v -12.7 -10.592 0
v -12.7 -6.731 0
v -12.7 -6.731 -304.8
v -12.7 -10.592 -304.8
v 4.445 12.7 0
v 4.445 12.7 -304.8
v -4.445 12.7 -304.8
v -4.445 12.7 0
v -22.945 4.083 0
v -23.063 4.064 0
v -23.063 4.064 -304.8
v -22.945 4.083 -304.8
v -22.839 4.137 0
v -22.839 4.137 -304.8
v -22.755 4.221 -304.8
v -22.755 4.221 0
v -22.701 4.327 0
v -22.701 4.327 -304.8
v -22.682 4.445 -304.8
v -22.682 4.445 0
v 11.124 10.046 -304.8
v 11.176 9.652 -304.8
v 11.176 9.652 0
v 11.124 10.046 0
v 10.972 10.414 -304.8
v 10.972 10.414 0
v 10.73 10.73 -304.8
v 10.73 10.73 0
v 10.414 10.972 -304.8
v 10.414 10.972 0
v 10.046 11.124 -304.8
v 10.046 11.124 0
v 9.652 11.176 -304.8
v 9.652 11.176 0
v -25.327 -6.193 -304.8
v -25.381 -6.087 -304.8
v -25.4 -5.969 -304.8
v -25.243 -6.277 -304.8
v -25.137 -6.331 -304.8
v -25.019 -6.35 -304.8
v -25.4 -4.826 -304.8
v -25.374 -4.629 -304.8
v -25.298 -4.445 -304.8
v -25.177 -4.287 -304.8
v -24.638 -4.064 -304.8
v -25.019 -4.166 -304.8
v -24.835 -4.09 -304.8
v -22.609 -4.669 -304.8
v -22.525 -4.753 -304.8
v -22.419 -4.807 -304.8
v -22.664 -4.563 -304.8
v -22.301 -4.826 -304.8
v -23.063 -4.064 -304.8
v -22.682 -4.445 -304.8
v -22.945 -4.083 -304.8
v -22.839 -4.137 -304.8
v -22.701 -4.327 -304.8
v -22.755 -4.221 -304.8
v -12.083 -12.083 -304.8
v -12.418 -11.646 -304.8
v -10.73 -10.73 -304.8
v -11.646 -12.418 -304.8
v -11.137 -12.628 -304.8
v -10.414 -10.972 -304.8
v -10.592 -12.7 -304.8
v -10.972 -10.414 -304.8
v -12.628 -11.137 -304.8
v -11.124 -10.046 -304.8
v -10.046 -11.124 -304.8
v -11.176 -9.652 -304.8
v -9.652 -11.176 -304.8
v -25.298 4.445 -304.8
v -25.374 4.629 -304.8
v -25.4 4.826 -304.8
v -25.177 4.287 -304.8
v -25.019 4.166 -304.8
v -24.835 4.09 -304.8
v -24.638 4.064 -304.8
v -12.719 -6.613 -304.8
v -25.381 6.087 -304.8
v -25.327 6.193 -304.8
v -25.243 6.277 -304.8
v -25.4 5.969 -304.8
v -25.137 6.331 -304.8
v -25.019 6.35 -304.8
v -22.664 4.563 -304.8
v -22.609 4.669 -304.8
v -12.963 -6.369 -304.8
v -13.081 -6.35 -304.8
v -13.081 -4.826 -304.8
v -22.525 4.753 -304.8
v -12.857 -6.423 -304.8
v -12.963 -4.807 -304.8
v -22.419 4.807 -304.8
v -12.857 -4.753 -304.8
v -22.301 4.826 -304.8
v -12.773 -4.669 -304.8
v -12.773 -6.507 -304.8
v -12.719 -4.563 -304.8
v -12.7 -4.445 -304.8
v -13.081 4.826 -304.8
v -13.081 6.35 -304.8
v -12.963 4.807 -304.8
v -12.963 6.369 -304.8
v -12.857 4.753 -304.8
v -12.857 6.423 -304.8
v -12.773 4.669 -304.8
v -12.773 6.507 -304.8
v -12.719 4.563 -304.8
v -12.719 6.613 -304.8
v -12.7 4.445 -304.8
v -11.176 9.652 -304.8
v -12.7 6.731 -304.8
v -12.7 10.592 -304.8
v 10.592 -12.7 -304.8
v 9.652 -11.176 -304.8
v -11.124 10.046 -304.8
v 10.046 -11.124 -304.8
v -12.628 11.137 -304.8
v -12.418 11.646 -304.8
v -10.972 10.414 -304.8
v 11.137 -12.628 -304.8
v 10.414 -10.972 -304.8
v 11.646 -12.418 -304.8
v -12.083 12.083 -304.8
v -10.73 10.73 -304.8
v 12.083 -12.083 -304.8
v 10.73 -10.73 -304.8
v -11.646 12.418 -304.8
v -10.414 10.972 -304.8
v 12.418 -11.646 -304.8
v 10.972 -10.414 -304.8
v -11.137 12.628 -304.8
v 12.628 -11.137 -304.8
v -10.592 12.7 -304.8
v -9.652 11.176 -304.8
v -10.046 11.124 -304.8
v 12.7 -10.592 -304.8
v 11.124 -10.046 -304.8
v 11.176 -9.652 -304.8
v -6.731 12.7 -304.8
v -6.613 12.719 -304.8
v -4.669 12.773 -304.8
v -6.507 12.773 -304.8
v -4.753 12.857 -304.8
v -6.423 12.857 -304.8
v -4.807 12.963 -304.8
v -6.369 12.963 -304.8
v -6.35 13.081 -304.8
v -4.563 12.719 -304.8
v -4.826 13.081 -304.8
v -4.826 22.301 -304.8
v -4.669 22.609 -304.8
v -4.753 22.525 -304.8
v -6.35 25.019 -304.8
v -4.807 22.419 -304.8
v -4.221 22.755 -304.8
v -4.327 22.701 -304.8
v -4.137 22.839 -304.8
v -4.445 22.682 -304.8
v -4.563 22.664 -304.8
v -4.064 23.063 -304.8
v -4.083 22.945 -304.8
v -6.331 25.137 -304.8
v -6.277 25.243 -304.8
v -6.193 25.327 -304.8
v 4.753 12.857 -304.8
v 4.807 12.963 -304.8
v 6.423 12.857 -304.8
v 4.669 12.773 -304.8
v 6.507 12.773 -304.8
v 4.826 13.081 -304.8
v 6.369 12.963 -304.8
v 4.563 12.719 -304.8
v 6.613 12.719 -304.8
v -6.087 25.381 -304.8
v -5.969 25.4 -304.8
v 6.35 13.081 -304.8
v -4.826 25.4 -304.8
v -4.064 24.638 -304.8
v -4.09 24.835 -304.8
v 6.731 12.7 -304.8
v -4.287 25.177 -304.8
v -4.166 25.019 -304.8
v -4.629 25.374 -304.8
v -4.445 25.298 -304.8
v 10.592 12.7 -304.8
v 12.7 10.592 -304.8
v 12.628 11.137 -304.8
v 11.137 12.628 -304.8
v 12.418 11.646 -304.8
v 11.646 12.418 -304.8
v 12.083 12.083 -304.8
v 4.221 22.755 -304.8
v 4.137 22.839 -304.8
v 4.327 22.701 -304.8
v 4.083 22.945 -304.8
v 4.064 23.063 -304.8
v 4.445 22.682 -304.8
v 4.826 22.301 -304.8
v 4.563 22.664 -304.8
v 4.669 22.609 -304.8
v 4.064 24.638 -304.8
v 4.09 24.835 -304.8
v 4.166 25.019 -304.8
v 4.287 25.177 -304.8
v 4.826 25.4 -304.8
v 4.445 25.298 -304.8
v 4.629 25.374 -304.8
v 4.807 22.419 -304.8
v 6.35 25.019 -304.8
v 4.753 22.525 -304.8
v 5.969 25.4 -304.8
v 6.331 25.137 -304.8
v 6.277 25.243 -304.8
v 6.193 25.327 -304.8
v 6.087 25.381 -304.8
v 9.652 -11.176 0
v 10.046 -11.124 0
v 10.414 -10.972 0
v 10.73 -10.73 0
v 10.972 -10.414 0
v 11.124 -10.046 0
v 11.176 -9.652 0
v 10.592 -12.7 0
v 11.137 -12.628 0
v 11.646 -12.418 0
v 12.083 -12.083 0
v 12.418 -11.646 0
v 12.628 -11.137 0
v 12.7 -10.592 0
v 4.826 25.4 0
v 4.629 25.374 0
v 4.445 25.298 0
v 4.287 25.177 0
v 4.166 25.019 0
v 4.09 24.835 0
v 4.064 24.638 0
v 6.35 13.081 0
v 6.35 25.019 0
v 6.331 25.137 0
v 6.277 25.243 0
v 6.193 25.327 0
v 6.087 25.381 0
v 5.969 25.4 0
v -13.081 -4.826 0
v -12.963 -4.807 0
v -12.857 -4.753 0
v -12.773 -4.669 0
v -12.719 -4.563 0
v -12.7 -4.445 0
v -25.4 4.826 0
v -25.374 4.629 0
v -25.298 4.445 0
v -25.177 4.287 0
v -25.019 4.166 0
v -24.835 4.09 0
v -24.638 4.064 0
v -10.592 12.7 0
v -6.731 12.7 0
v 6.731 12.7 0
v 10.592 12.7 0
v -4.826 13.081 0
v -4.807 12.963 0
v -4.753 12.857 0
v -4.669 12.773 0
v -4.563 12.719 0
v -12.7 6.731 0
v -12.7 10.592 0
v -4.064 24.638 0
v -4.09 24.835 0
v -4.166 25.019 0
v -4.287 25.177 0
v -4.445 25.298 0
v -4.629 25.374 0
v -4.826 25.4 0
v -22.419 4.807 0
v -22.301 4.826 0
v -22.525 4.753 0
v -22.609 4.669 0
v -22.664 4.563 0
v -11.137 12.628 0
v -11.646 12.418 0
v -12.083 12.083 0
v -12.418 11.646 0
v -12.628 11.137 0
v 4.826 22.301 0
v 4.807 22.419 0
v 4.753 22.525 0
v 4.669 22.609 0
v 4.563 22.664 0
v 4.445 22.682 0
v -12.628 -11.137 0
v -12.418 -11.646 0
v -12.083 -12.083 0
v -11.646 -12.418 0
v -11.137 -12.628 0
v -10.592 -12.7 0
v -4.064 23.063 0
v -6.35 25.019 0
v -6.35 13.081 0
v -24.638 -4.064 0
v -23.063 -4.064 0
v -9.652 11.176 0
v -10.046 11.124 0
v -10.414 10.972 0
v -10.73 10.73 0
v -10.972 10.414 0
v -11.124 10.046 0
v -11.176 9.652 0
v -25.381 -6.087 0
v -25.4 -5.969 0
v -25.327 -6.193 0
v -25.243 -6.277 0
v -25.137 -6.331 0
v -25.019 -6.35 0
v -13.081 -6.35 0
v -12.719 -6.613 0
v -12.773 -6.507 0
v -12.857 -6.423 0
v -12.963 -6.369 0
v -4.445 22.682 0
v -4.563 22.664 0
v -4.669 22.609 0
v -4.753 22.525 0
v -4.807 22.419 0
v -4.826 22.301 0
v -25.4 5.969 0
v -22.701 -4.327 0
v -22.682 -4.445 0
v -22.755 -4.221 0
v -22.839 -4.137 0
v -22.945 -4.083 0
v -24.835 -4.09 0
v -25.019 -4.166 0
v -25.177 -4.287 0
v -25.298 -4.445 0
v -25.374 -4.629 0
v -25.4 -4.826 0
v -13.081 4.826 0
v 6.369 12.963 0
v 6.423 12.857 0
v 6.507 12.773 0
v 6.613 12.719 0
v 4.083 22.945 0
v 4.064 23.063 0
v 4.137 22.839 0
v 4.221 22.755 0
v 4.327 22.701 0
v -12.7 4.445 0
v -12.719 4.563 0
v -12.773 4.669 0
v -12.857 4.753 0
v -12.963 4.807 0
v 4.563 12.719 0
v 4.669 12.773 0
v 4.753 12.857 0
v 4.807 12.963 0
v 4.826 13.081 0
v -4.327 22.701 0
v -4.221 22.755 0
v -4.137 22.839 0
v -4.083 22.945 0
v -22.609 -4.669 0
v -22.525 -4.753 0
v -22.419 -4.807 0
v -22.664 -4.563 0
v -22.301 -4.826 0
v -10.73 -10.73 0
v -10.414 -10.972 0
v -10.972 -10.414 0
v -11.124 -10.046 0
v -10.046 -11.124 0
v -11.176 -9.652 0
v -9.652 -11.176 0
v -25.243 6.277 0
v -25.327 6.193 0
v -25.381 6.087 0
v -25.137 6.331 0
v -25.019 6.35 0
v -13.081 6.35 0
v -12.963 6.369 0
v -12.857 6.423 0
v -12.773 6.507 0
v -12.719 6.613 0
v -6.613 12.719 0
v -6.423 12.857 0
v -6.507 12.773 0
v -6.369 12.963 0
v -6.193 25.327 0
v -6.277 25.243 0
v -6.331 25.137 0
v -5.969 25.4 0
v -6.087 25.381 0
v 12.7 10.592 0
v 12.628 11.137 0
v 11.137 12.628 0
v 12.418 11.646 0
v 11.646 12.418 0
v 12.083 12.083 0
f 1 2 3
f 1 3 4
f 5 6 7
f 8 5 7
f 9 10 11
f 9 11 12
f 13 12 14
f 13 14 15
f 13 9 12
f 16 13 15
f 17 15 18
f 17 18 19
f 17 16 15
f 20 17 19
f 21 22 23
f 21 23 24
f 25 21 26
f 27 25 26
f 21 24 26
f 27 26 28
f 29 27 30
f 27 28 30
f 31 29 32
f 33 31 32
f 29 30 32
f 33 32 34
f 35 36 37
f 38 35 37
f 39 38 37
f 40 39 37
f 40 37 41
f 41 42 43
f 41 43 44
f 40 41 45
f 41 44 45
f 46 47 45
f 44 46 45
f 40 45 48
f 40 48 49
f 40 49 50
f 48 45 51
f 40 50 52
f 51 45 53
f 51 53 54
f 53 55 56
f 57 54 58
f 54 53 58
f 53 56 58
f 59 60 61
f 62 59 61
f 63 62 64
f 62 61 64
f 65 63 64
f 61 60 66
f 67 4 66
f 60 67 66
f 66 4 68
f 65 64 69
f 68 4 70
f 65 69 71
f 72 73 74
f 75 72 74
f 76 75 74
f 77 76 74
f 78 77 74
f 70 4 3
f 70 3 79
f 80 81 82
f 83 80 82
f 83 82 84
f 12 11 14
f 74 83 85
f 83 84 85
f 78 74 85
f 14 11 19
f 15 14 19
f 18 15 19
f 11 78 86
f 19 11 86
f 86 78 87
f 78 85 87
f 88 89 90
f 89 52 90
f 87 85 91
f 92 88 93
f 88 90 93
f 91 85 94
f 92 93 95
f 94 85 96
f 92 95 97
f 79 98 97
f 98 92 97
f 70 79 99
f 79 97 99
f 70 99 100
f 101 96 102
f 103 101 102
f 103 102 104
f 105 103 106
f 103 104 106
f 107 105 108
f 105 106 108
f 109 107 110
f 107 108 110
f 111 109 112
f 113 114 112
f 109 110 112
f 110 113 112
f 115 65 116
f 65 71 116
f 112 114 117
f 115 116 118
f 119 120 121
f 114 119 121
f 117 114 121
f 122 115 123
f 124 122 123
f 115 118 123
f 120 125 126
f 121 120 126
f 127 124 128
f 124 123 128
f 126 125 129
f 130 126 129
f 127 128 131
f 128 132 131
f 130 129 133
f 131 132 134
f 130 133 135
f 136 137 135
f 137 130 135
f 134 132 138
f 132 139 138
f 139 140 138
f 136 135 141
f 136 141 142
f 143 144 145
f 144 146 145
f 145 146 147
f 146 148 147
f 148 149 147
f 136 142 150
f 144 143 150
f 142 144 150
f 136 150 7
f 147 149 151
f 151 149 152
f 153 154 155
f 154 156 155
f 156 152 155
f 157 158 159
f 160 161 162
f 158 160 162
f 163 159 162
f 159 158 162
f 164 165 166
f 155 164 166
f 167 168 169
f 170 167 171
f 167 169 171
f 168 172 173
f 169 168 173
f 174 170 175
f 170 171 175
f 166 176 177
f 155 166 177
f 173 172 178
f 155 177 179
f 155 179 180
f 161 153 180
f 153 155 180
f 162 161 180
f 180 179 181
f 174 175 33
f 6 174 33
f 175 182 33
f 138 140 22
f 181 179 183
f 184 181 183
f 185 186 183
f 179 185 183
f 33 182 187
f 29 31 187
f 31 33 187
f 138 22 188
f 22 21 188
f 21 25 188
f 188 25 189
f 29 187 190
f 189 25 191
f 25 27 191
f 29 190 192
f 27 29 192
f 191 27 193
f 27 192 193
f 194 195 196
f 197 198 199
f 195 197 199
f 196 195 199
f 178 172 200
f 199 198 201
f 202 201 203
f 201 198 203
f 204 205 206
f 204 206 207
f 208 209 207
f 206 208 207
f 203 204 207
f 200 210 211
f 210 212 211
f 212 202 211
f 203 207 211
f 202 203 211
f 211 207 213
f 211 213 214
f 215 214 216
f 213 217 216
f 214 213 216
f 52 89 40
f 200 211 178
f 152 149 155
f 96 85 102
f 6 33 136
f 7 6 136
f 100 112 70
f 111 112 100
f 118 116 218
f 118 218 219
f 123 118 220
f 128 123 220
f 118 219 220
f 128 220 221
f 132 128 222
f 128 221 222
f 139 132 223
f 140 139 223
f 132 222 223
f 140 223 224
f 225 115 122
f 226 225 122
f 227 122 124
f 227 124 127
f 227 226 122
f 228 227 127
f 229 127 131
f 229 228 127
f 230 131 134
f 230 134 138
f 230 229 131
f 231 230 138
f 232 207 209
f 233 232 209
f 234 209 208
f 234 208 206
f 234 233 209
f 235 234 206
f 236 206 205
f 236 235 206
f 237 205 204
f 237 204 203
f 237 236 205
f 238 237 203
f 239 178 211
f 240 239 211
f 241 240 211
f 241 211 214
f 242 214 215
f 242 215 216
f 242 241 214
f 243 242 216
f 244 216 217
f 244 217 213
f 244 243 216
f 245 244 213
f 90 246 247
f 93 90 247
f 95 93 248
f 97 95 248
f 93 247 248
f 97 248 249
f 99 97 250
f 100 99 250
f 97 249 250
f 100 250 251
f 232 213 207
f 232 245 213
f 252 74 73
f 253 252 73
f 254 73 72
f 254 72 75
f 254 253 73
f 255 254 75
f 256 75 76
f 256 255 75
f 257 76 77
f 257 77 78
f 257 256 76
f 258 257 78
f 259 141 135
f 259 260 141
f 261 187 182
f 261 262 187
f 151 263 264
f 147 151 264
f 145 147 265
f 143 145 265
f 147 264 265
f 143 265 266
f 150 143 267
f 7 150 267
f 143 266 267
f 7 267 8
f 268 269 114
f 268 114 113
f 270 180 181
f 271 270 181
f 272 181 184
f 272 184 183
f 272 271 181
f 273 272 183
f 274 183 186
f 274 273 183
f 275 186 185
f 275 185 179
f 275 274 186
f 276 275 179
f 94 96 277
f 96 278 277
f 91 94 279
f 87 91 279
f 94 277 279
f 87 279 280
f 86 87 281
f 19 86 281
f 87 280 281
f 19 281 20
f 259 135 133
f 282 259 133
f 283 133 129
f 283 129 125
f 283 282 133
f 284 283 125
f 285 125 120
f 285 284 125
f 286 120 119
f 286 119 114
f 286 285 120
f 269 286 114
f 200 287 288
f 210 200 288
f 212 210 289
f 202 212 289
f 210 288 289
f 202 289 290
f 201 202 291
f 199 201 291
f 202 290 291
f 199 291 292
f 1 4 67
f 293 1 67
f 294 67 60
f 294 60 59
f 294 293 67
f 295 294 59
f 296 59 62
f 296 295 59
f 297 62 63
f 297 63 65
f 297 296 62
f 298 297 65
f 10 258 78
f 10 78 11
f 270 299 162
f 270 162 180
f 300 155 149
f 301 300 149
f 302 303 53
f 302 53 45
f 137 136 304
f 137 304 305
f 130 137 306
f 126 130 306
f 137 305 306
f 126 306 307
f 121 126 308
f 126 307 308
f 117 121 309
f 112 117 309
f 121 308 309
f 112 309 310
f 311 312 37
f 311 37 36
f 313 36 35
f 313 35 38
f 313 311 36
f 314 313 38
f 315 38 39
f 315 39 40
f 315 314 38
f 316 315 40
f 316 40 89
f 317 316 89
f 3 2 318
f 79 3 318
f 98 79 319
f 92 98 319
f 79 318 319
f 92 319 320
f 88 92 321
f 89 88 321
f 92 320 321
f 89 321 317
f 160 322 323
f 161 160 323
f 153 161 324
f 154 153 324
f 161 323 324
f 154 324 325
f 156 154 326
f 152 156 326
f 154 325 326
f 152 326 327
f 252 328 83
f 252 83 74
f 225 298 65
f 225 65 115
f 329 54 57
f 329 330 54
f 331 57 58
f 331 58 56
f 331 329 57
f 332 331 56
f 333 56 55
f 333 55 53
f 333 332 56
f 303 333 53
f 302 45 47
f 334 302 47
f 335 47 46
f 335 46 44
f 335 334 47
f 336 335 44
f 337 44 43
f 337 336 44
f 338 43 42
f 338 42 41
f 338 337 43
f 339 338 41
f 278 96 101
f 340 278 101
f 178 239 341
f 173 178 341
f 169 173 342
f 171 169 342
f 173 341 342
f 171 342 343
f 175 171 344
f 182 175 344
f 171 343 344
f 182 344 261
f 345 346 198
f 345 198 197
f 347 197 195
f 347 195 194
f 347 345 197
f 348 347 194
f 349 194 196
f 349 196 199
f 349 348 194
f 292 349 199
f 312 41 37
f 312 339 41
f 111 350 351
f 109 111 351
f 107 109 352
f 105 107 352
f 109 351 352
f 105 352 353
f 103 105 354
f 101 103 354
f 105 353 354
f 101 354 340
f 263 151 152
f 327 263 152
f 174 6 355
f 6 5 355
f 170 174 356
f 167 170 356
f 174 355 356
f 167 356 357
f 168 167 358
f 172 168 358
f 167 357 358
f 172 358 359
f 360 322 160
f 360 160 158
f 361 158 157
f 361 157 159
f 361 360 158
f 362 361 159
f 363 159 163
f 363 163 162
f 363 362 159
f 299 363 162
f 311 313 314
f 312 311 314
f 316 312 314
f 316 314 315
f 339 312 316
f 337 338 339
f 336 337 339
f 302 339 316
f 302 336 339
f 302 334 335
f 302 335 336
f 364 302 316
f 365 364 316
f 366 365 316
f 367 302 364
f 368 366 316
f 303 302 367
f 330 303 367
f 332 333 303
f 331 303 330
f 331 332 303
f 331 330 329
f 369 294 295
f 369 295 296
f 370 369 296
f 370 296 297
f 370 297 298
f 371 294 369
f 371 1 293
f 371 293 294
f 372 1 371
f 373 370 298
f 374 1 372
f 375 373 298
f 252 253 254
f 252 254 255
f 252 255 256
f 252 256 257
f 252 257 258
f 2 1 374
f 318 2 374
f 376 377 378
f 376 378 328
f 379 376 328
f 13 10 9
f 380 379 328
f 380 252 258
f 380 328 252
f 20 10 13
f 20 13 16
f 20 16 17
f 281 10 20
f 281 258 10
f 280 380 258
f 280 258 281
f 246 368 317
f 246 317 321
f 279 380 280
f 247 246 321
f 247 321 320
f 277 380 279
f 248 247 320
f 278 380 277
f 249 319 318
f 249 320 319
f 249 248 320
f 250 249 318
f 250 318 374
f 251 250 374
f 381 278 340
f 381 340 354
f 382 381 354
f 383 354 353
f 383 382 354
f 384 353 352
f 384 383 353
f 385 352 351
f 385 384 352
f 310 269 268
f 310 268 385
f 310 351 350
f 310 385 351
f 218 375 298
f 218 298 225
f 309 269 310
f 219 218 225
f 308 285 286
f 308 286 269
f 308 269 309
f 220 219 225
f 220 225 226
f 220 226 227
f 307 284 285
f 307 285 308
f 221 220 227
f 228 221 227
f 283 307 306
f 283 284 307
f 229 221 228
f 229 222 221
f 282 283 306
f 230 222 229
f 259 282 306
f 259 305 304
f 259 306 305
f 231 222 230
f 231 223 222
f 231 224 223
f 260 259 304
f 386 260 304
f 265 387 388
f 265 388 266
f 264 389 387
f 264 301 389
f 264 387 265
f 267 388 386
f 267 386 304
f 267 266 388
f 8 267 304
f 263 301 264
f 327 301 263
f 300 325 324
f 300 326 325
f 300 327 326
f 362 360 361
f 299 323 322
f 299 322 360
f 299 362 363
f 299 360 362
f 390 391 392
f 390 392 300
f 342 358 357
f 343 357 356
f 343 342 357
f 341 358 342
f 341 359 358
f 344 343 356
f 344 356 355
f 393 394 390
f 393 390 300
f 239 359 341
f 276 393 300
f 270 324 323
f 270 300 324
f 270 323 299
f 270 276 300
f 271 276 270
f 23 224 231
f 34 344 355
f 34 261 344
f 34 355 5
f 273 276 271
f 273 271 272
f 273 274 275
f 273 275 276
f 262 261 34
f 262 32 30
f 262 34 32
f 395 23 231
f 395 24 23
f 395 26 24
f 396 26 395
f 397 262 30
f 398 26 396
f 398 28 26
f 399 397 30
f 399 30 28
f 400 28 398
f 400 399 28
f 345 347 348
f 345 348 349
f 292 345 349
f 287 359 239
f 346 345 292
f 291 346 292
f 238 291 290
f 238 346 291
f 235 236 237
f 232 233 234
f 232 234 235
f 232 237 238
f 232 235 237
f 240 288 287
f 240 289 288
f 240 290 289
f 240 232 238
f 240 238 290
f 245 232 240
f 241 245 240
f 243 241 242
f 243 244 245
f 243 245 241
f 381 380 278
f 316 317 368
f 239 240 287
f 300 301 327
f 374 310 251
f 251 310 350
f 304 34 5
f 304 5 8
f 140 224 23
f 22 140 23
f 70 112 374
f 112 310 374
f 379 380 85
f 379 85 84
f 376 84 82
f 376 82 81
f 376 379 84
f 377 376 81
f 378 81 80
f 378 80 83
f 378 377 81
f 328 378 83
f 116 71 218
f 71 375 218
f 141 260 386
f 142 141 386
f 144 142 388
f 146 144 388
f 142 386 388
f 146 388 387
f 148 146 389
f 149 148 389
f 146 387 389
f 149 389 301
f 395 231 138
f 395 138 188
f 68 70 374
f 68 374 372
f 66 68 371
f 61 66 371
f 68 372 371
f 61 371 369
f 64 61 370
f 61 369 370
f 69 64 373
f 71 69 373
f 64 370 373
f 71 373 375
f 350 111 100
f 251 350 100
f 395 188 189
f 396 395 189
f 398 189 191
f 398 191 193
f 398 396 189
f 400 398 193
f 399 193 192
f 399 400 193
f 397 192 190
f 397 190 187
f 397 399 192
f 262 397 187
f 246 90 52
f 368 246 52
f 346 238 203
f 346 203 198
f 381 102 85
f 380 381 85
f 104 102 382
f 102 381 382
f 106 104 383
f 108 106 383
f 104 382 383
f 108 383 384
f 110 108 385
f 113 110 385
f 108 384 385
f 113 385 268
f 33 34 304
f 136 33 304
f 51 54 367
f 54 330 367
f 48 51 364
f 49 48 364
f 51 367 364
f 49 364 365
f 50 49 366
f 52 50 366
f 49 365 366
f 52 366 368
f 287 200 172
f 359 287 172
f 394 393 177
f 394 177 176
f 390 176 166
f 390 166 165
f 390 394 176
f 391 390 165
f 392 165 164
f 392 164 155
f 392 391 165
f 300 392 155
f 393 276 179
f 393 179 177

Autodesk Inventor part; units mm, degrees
ref_plane "YZ Plane" through (0, 0, 0) normal (1, 0, 0) x (0, 1, 0)
ref_plane "XZ Plane" through (0, 0, 0) normal (0, 1, 0) x (-1, 0, 0)
ref_plane "XY Plane" through (0, 0, 0) normal (0, 0, 1) x (1, 0, 0)
sketch "Sketch1" plane through (0, 0, 0) normal (0, 0, 1) x (1, 0, 0)
  line L0 (-9.652, -11.176) -> (9.652, -11.176)
  arc A0 (-11.176, -9.652) -> (-9.652, -11.176) centre (-9.652, -9.652) ccw
  line L1 (-11.176, 9.652) -> (-11.176, -9.652)
  arc A1 (-9.652, 11.176) -> (-11.176, 9.652) centre (-9.652, 9.652) ccw
  line L2 (9.652, 11.176) -> (-9.652, 11.176)
  arc A2 (11.176, 9.652) -> (9.652, 11.176) centre (9.652, 9.652) ccw
  line L3 (11.176, -9.652) -> (11.176, 9.652)
  arc A3 (9.652, -11.176) -> (11.176, -9.652) centre (9.652, -9.652) ccw
  arc A4 (-6.731, 12.7) -> (-6.35, 13.081) centre (-6.731, 13.081) ccw
  line L4 (-6.731, 12.7) -> (-10.5918, 12.7)
  arc A5 (-10.5918, 12.7) -> (-12.7, 10.5918) centre (-10.5918, 10.5918) ccw
  line L5 (-12.7, 10.5918) -> (-12.7, 6.731)
  arc A6 (-13.081, 6.35) -> (-12.7, 6.731) centre (-13.081, 6.731) ccw
  line L6 (-13.081, 6.35) -> (-25.019, 6.35)
  arc A7 (-25.019, 6.35) -> (-25.4, 5.969) centre (-25.019, 5.969) ccw
  line L7 (-25.4, 5.969) -> (-25.4, 4.826)
  arc A8 (-25.4, 4.826) -> (-24.638, 4.064) centre (-24.638, 4.826) ccw
  line L8 (-24.638, 4.064) -> (-23.0632, 4.064)
  arc A9 (-23.0632, 4.064) -> (-22.6822, 4.445) centre (-23.0632, 4.445) ccw
  arc A10 (-22.3012, 4.826) -> (-22.6822, 4.445) centre (-22.3012, 4.445) ccw
  line L9 (-22.3012, 4.826) -> (-13.081, 4.826)
  arc A11 (-12.7, 4.445) -> (-13.081, 4.826) centre (-13.081, 4.445) ccw
  line L10 (-12.7, 4.445) -> (-12.7, -4.445)
  arc A12 (-13.081, -4.826) -> (-12.7, -4.445) centre (-13.081, -4.445) ccw
  line L11 (-13.081, -4.826) -> (-22.3012, -4.826)
  arc A13 (-22.6822, -4.445) -> (-22.3012, -4.826) centre (-22.3012, -4.445) ccw
  arc A14 (-22.6822, -4.445) -> (-23.0632, -4.064) centre (-23.0632, -4.445) ccw
  line L12 (-23.0632, -4.064) -> (-24.638, -4.064)
  arc A15 (-24.638, -4.064) -> (-25.4, -4.826) centre (-24.638, -4.826) ccw
  line L13 (-25.4, -4.826) -> (-25.4, -5.969)
  arc A16 (-25.4, -5.969) -> (-25.019, -6.35) centre (-25.019, -5.969) ccw
  line L14 (-25.019, -6.35) -> (-13.081, -6.35)
  arc A17 (-12.7, -6.731) -> (-13.081, -6.35) centre (-13.081, -6.731) ccw
  line L15 (-12.7, -6.731) -> (-12.7, -10.5918)
  arc A18 (-12.7, -10.5918) -> (-10.5918, -12.7) centre (-10.5918, -10.5918) ccw
  line L16 (-10.5918, -12.7) -> (10.5918, -12.7)
  arc A19 (10.5918, -12.7) -> (12.7, -10.5918) centre (10.5918, -10.5918) ccw
  line L17 (12.7, -10.5918) -> (12.7, 10.5918)
  arc A20 (12.7, 10.5918) -> (10.5918, 12.7) centre (10.5918, 10.5918) ccw
  line L18 (10.5918, 12.7) -> (6.731, 12.7)
  arc A21 (6.35, 13.081) -> (6.731, 12.7) centre (6.731, 13.081) ccw
  line L19 (6.35, 13.081) -> (6.35, 25.019)
  arc A22 (6.35, 25.019) -> (5.969, 25.4) centre (5.969, 25.019) ccw
  line L20 (5.969, 25.4) -> (4.826, 25.4)
  arc A23 (4.826, 25.4) -> (4.064, 24.638) centre (4.826, 24.638) ccw
  line L21 (4.064, 24.638) -> (4.064, 23.0632)
  arc A24 (4.064, 23.0632) -> (4.445, 22.6822) centre (4.445, 23.0632) ccw
  arc A25 (4.826, 22.3012) -> (4.445, 22.6822) centre (4.445, 22.3012) ccw
  line L22 (4.826, 22.3012) -> (4.826, 13.081)
  arc A26 (4.445, 12.7) -> (4.826, 13.081) centre (4.445, 13.081) ccw
  line L23 (4.445, 12.7) -> (-4.445, 12.7)
  arc A27 (-4.826, 13.081) -> (-4.445, 12.7) centre (-4.445, 13.081) ccw
  line L24 (-4.826, 13.081) -> (-4.826, 22.3012)
  arc A28 (-4.445, 22.6822) -> (-4.826, 22.3012) centre (-4.445, 22.3012) ccw
  arc A29 (-4.445, 22.6822) -> (-4.064, 23.0632) centre (-4.445, 23.0632) ccw
  line L25 (-4.064, 23.0632) -> (-4.064, 24.638)
  arc A30 (-4.064, 24.638) -> (-4.826, 25.4) centre (-4.826, 24.638) ccw
  line L26 (-4.826, 25.4) -> (-5.969, 25.4)
  arc A31 (-5.969, 25.4) -> (-6.35, 25.019) centre (-5.969, 25.019) ccw
  line L27 (-6.35, 25.019) -> (-6.35, 13.081)
  point P0 (0, 0)
extrude "Extrusion1" add sketch "Sketch1" against normal blind 304.8
properties part number "9030"
